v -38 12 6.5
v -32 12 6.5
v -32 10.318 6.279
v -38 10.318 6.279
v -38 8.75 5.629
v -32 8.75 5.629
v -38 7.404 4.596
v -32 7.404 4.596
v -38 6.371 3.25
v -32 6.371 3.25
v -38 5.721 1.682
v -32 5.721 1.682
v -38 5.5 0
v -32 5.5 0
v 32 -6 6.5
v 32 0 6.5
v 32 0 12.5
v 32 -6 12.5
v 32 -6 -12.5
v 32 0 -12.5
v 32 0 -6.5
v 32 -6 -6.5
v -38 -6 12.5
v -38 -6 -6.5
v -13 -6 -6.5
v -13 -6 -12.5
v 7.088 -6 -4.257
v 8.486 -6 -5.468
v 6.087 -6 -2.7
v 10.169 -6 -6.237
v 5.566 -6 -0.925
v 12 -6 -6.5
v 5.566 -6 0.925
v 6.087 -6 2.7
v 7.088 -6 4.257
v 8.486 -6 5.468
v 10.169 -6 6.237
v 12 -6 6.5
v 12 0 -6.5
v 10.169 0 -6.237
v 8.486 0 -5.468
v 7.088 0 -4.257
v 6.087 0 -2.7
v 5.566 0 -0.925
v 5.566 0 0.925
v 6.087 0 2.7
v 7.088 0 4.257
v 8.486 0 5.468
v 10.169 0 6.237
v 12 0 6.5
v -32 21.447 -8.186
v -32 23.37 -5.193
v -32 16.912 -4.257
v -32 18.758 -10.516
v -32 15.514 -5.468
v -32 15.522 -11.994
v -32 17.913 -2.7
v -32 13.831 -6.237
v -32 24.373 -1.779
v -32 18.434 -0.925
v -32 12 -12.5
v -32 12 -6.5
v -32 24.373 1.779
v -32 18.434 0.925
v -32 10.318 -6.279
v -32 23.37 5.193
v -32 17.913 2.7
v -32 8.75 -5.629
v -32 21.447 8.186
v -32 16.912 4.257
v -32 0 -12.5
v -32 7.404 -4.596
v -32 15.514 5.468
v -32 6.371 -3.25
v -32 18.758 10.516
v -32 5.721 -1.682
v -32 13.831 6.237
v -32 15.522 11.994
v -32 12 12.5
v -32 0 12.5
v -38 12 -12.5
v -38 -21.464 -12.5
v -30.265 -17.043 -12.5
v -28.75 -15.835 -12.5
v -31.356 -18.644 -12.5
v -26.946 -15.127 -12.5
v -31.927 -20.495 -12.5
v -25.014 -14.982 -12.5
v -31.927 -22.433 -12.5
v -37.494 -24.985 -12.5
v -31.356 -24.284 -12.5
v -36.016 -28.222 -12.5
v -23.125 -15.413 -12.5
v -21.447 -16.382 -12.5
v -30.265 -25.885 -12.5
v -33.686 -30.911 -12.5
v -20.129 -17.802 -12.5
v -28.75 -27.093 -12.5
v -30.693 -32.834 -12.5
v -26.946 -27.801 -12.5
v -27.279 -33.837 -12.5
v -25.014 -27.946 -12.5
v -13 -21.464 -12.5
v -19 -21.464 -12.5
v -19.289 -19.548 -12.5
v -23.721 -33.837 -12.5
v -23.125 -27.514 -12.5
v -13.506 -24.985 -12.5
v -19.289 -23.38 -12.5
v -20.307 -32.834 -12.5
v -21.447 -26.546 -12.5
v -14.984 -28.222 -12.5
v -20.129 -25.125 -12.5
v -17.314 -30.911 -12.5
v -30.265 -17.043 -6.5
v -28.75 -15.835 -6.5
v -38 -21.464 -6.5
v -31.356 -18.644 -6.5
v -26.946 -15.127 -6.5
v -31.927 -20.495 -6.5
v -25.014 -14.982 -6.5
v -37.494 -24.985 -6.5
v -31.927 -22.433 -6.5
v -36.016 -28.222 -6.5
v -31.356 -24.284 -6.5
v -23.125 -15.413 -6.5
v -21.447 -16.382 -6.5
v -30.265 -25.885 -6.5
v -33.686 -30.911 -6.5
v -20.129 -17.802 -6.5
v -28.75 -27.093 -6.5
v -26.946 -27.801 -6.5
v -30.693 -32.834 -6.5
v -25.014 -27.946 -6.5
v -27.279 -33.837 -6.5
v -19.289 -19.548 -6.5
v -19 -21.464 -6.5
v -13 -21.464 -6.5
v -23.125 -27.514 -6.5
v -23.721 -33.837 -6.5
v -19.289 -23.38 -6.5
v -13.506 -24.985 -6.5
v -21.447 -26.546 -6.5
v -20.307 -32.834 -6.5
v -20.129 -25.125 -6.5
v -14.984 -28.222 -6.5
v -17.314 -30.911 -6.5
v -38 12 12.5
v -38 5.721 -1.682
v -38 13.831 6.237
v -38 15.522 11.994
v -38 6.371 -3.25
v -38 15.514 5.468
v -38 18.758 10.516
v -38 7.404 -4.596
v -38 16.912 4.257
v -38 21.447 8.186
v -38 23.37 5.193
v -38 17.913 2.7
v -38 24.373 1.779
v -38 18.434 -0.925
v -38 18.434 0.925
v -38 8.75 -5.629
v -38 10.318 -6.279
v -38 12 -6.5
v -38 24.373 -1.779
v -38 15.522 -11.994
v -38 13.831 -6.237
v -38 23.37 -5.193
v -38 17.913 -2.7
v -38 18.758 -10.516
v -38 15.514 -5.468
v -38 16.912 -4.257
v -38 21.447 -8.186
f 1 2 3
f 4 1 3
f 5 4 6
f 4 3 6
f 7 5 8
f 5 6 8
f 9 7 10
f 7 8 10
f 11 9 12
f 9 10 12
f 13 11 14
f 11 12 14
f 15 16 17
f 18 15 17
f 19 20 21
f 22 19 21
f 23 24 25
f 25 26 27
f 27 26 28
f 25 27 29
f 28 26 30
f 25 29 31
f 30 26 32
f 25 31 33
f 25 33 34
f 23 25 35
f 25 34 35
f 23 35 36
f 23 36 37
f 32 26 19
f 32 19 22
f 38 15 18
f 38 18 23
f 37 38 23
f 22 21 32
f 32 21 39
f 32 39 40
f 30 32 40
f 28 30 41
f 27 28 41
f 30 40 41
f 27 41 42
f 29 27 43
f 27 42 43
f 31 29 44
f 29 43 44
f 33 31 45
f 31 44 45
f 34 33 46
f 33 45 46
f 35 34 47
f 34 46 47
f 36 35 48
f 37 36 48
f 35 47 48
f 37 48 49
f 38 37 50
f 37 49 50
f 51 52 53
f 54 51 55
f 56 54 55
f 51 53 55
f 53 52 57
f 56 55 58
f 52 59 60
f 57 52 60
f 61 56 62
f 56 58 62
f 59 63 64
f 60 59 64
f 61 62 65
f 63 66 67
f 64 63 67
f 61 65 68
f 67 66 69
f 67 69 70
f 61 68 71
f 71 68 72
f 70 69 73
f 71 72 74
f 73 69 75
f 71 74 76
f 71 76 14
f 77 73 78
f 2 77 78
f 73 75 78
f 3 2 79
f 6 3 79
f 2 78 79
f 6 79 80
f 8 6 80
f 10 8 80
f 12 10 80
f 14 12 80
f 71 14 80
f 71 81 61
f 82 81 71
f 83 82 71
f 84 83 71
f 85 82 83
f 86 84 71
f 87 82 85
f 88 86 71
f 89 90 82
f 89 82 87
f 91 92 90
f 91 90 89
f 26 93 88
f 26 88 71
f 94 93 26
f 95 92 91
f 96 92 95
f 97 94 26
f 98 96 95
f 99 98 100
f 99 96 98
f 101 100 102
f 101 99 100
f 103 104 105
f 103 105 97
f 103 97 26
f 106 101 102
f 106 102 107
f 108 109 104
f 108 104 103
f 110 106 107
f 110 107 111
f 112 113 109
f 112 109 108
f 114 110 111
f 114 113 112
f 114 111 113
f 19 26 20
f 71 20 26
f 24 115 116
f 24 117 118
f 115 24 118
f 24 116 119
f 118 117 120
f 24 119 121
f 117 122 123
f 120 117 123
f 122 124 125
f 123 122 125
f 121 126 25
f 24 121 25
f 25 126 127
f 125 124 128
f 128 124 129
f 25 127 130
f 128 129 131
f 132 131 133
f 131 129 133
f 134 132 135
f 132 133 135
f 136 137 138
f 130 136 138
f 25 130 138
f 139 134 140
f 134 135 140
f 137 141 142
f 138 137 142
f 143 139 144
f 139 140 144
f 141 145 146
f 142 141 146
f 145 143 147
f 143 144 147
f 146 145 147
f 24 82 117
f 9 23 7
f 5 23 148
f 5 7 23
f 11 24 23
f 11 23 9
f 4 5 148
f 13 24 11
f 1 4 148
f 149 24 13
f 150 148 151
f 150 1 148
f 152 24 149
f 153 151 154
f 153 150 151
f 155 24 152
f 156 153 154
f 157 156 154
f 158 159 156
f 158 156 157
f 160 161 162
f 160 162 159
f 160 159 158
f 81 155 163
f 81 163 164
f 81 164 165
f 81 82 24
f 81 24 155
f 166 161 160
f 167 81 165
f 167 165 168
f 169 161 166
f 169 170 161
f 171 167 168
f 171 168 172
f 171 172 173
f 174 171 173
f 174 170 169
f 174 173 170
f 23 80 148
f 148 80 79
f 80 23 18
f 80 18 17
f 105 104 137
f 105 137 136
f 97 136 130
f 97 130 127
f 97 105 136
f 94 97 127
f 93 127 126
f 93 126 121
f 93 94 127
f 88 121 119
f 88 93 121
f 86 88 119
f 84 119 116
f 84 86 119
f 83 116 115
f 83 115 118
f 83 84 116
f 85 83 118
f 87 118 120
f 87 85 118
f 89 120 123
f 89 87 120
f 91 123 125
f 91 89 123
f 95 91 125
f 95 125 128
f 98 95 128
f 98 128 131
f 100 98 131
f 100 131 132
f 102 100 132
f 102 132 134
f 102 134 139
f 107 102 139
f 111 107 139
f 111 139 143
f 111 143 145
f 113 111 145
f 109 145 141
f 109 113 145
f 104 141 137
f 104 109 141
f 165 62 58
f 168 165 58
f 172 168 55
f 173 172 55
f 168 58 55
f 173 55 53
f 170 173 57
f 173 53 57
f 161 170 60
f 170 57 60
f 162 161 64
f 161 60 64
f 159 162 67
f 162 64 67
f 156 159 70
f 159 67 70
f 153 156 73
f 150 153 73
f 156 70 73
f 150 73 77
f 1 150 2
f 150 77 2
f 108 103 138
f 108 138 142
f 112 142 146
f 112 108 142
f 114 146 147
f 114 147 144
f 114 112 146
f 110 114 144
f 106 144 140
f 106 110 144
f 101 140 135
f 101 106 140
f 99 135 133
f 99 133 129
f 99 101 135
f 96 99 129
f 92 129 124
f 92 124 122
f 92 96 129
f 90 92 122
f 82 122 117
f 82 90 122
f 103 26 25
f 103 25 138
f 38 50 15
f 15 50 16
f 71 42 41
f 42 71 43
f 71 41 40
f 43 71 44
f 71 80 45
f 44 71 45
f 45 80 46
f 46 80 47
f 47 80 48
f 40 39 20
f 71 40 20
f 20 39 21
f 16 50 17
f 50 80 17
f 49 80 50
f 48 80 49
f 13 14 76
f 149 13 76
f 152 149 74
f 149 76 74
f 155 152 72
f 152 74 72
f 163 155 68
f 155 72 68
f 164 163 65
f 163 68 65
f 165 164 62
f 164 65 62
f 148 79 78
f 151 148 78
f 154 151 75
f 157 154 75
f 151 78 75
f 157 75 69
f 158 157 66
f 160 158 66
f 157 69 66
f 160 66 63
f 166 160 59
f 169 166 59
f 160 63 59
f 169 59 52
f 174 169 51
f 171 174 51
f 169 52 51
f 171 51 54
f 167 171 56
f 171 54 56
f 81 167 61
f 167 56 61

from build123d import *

# Parameters (mm, degrees)
F1_DEPTH = 6
F3_DEPTH = 6
F5_DEPTH = 6


with BuildPart() as f1:
    # F0 (on Front) → F1 (new body)
    with BuildSketch(Plane.XZ):
        with BuildLine():
            Line((32, 12.5), (-32, 12.5))
            Line((-32, 12.5), (-32, -12.5))
            Line((-32, -12.5), (32, -12.5))
            Line((32, -12.5), (32, -6.5))
            Line((32, -6.5), (12, -6.5))
            ThreePointArc((12, -6.5), (5.5, 0), (12, 6.5))
            Line((12, 6.5), (32, 6.5))
            Line((32, 6.5), (32, 12.5))
        make_face()
    extrude(amount=F1_DEPTH)

    # F2 (on face) → F3 (join)
    with BuildSketch(Plane(origin=(-32, 0, 0), x_dir=(0, -1, 0), z_dir=(-1, 0, 0))):
        with BuildLine():
            Line((6, -12.5), (6, 12.5))
            Line((6, 12.5), (-12, 12.5))
            ThreePointArc((-12, 12.5), (-3.1611652352, 8.8388347648), (0.5, 0))
            ThreePointArc((0.5, 0), (-3.1611652352, -8.8388347648), (-12, -12.5))
            Line((-12, -12.5), (6, -12.5))
        make_face()
        with BuildLine():
            ThreePointArc((0.5, 0), (-3.1611652352, 8.8388347648), (-12, 12.5))
            Line((-12, 12.5), (-12, 6.5))
            ThreePointArc((-12, 6.5), (-7.4038059223, 4.5961940777), (-5.5, 0))
            ThreePointArc((-5.5, 0), (-7.4038059223, -4.5961940777), (-12, -6.5))
            Line((-12, -6.5), (-12, -12.5))
            ThreePointArc((-12, -12.5), (-3.1611652352, -8.8388347648), (0.5, 0))
        make_face()
        with BuildLine():
            Line((-12, 6.5), (-12, 12.5))
            ThreePointArc((-12, 12.5), (-24.5, 0), (-12, -12.5))
            Line((-12, -12.5), (-12, -6.5))
            ThreePointArc((-12, -6.5), (-18.5, 0), (-12, 6.5))
        make_face()
    extrude(amount=F3_DEPTH)

    # F4 (on face) → F5 (join)
    with BuildSketch(Plane(origin=(0, 0, -12.5), x_dir=(1, 0, 0), z_dir=(0, 0, -1))):
        with BuildLine():
            ThreePointArc((-13, 21.4638169855), (-25.5, 33.9638169855), (-38, 21.4638169855))
            Line((-38, 21.4638169855), (-32, 21.4638169855))
            ThreePointArc((-32, 21.4638169855), (-25.5, 27.9638169855), (-19, 21.4638169855))
            Line((-19, 21.4638169855), (-13, 21.4638169855))
        make_face()
        with BuildLine():
            Line((-32, 21.4638169855), (-38, 21.4638169855))
            ThreePointArc((-38, 21.4638169855), (-25.5, 8.9638169855), (-13, 21.4638169855))
            Line((-13, 21.4638169855), (-19, 21.4638169855))
            ThreePointArc((-19, 21.4638169855), (-25.5, 14.9638169855), (-32, 21.4638169855))
        make_face()
        Polygon((-38, 6), (-38, 0), (-32, 0), (-13, 0), (-13, 6), align=None)
        with BuildLine():
            Line((-38, 21.4638169855), (-38, 6))
            Line((-38, 6), (-13, 6))
            Line((-13, 6), (-13, 21.4638169855))
            ThreePointArc((-13, 21.4638169855), (-25.5, 8.9638169855), (-38, 21.4638169855))
        make_face()
    extrude(amount=-F5_DEPTH)


solid = f1.part
